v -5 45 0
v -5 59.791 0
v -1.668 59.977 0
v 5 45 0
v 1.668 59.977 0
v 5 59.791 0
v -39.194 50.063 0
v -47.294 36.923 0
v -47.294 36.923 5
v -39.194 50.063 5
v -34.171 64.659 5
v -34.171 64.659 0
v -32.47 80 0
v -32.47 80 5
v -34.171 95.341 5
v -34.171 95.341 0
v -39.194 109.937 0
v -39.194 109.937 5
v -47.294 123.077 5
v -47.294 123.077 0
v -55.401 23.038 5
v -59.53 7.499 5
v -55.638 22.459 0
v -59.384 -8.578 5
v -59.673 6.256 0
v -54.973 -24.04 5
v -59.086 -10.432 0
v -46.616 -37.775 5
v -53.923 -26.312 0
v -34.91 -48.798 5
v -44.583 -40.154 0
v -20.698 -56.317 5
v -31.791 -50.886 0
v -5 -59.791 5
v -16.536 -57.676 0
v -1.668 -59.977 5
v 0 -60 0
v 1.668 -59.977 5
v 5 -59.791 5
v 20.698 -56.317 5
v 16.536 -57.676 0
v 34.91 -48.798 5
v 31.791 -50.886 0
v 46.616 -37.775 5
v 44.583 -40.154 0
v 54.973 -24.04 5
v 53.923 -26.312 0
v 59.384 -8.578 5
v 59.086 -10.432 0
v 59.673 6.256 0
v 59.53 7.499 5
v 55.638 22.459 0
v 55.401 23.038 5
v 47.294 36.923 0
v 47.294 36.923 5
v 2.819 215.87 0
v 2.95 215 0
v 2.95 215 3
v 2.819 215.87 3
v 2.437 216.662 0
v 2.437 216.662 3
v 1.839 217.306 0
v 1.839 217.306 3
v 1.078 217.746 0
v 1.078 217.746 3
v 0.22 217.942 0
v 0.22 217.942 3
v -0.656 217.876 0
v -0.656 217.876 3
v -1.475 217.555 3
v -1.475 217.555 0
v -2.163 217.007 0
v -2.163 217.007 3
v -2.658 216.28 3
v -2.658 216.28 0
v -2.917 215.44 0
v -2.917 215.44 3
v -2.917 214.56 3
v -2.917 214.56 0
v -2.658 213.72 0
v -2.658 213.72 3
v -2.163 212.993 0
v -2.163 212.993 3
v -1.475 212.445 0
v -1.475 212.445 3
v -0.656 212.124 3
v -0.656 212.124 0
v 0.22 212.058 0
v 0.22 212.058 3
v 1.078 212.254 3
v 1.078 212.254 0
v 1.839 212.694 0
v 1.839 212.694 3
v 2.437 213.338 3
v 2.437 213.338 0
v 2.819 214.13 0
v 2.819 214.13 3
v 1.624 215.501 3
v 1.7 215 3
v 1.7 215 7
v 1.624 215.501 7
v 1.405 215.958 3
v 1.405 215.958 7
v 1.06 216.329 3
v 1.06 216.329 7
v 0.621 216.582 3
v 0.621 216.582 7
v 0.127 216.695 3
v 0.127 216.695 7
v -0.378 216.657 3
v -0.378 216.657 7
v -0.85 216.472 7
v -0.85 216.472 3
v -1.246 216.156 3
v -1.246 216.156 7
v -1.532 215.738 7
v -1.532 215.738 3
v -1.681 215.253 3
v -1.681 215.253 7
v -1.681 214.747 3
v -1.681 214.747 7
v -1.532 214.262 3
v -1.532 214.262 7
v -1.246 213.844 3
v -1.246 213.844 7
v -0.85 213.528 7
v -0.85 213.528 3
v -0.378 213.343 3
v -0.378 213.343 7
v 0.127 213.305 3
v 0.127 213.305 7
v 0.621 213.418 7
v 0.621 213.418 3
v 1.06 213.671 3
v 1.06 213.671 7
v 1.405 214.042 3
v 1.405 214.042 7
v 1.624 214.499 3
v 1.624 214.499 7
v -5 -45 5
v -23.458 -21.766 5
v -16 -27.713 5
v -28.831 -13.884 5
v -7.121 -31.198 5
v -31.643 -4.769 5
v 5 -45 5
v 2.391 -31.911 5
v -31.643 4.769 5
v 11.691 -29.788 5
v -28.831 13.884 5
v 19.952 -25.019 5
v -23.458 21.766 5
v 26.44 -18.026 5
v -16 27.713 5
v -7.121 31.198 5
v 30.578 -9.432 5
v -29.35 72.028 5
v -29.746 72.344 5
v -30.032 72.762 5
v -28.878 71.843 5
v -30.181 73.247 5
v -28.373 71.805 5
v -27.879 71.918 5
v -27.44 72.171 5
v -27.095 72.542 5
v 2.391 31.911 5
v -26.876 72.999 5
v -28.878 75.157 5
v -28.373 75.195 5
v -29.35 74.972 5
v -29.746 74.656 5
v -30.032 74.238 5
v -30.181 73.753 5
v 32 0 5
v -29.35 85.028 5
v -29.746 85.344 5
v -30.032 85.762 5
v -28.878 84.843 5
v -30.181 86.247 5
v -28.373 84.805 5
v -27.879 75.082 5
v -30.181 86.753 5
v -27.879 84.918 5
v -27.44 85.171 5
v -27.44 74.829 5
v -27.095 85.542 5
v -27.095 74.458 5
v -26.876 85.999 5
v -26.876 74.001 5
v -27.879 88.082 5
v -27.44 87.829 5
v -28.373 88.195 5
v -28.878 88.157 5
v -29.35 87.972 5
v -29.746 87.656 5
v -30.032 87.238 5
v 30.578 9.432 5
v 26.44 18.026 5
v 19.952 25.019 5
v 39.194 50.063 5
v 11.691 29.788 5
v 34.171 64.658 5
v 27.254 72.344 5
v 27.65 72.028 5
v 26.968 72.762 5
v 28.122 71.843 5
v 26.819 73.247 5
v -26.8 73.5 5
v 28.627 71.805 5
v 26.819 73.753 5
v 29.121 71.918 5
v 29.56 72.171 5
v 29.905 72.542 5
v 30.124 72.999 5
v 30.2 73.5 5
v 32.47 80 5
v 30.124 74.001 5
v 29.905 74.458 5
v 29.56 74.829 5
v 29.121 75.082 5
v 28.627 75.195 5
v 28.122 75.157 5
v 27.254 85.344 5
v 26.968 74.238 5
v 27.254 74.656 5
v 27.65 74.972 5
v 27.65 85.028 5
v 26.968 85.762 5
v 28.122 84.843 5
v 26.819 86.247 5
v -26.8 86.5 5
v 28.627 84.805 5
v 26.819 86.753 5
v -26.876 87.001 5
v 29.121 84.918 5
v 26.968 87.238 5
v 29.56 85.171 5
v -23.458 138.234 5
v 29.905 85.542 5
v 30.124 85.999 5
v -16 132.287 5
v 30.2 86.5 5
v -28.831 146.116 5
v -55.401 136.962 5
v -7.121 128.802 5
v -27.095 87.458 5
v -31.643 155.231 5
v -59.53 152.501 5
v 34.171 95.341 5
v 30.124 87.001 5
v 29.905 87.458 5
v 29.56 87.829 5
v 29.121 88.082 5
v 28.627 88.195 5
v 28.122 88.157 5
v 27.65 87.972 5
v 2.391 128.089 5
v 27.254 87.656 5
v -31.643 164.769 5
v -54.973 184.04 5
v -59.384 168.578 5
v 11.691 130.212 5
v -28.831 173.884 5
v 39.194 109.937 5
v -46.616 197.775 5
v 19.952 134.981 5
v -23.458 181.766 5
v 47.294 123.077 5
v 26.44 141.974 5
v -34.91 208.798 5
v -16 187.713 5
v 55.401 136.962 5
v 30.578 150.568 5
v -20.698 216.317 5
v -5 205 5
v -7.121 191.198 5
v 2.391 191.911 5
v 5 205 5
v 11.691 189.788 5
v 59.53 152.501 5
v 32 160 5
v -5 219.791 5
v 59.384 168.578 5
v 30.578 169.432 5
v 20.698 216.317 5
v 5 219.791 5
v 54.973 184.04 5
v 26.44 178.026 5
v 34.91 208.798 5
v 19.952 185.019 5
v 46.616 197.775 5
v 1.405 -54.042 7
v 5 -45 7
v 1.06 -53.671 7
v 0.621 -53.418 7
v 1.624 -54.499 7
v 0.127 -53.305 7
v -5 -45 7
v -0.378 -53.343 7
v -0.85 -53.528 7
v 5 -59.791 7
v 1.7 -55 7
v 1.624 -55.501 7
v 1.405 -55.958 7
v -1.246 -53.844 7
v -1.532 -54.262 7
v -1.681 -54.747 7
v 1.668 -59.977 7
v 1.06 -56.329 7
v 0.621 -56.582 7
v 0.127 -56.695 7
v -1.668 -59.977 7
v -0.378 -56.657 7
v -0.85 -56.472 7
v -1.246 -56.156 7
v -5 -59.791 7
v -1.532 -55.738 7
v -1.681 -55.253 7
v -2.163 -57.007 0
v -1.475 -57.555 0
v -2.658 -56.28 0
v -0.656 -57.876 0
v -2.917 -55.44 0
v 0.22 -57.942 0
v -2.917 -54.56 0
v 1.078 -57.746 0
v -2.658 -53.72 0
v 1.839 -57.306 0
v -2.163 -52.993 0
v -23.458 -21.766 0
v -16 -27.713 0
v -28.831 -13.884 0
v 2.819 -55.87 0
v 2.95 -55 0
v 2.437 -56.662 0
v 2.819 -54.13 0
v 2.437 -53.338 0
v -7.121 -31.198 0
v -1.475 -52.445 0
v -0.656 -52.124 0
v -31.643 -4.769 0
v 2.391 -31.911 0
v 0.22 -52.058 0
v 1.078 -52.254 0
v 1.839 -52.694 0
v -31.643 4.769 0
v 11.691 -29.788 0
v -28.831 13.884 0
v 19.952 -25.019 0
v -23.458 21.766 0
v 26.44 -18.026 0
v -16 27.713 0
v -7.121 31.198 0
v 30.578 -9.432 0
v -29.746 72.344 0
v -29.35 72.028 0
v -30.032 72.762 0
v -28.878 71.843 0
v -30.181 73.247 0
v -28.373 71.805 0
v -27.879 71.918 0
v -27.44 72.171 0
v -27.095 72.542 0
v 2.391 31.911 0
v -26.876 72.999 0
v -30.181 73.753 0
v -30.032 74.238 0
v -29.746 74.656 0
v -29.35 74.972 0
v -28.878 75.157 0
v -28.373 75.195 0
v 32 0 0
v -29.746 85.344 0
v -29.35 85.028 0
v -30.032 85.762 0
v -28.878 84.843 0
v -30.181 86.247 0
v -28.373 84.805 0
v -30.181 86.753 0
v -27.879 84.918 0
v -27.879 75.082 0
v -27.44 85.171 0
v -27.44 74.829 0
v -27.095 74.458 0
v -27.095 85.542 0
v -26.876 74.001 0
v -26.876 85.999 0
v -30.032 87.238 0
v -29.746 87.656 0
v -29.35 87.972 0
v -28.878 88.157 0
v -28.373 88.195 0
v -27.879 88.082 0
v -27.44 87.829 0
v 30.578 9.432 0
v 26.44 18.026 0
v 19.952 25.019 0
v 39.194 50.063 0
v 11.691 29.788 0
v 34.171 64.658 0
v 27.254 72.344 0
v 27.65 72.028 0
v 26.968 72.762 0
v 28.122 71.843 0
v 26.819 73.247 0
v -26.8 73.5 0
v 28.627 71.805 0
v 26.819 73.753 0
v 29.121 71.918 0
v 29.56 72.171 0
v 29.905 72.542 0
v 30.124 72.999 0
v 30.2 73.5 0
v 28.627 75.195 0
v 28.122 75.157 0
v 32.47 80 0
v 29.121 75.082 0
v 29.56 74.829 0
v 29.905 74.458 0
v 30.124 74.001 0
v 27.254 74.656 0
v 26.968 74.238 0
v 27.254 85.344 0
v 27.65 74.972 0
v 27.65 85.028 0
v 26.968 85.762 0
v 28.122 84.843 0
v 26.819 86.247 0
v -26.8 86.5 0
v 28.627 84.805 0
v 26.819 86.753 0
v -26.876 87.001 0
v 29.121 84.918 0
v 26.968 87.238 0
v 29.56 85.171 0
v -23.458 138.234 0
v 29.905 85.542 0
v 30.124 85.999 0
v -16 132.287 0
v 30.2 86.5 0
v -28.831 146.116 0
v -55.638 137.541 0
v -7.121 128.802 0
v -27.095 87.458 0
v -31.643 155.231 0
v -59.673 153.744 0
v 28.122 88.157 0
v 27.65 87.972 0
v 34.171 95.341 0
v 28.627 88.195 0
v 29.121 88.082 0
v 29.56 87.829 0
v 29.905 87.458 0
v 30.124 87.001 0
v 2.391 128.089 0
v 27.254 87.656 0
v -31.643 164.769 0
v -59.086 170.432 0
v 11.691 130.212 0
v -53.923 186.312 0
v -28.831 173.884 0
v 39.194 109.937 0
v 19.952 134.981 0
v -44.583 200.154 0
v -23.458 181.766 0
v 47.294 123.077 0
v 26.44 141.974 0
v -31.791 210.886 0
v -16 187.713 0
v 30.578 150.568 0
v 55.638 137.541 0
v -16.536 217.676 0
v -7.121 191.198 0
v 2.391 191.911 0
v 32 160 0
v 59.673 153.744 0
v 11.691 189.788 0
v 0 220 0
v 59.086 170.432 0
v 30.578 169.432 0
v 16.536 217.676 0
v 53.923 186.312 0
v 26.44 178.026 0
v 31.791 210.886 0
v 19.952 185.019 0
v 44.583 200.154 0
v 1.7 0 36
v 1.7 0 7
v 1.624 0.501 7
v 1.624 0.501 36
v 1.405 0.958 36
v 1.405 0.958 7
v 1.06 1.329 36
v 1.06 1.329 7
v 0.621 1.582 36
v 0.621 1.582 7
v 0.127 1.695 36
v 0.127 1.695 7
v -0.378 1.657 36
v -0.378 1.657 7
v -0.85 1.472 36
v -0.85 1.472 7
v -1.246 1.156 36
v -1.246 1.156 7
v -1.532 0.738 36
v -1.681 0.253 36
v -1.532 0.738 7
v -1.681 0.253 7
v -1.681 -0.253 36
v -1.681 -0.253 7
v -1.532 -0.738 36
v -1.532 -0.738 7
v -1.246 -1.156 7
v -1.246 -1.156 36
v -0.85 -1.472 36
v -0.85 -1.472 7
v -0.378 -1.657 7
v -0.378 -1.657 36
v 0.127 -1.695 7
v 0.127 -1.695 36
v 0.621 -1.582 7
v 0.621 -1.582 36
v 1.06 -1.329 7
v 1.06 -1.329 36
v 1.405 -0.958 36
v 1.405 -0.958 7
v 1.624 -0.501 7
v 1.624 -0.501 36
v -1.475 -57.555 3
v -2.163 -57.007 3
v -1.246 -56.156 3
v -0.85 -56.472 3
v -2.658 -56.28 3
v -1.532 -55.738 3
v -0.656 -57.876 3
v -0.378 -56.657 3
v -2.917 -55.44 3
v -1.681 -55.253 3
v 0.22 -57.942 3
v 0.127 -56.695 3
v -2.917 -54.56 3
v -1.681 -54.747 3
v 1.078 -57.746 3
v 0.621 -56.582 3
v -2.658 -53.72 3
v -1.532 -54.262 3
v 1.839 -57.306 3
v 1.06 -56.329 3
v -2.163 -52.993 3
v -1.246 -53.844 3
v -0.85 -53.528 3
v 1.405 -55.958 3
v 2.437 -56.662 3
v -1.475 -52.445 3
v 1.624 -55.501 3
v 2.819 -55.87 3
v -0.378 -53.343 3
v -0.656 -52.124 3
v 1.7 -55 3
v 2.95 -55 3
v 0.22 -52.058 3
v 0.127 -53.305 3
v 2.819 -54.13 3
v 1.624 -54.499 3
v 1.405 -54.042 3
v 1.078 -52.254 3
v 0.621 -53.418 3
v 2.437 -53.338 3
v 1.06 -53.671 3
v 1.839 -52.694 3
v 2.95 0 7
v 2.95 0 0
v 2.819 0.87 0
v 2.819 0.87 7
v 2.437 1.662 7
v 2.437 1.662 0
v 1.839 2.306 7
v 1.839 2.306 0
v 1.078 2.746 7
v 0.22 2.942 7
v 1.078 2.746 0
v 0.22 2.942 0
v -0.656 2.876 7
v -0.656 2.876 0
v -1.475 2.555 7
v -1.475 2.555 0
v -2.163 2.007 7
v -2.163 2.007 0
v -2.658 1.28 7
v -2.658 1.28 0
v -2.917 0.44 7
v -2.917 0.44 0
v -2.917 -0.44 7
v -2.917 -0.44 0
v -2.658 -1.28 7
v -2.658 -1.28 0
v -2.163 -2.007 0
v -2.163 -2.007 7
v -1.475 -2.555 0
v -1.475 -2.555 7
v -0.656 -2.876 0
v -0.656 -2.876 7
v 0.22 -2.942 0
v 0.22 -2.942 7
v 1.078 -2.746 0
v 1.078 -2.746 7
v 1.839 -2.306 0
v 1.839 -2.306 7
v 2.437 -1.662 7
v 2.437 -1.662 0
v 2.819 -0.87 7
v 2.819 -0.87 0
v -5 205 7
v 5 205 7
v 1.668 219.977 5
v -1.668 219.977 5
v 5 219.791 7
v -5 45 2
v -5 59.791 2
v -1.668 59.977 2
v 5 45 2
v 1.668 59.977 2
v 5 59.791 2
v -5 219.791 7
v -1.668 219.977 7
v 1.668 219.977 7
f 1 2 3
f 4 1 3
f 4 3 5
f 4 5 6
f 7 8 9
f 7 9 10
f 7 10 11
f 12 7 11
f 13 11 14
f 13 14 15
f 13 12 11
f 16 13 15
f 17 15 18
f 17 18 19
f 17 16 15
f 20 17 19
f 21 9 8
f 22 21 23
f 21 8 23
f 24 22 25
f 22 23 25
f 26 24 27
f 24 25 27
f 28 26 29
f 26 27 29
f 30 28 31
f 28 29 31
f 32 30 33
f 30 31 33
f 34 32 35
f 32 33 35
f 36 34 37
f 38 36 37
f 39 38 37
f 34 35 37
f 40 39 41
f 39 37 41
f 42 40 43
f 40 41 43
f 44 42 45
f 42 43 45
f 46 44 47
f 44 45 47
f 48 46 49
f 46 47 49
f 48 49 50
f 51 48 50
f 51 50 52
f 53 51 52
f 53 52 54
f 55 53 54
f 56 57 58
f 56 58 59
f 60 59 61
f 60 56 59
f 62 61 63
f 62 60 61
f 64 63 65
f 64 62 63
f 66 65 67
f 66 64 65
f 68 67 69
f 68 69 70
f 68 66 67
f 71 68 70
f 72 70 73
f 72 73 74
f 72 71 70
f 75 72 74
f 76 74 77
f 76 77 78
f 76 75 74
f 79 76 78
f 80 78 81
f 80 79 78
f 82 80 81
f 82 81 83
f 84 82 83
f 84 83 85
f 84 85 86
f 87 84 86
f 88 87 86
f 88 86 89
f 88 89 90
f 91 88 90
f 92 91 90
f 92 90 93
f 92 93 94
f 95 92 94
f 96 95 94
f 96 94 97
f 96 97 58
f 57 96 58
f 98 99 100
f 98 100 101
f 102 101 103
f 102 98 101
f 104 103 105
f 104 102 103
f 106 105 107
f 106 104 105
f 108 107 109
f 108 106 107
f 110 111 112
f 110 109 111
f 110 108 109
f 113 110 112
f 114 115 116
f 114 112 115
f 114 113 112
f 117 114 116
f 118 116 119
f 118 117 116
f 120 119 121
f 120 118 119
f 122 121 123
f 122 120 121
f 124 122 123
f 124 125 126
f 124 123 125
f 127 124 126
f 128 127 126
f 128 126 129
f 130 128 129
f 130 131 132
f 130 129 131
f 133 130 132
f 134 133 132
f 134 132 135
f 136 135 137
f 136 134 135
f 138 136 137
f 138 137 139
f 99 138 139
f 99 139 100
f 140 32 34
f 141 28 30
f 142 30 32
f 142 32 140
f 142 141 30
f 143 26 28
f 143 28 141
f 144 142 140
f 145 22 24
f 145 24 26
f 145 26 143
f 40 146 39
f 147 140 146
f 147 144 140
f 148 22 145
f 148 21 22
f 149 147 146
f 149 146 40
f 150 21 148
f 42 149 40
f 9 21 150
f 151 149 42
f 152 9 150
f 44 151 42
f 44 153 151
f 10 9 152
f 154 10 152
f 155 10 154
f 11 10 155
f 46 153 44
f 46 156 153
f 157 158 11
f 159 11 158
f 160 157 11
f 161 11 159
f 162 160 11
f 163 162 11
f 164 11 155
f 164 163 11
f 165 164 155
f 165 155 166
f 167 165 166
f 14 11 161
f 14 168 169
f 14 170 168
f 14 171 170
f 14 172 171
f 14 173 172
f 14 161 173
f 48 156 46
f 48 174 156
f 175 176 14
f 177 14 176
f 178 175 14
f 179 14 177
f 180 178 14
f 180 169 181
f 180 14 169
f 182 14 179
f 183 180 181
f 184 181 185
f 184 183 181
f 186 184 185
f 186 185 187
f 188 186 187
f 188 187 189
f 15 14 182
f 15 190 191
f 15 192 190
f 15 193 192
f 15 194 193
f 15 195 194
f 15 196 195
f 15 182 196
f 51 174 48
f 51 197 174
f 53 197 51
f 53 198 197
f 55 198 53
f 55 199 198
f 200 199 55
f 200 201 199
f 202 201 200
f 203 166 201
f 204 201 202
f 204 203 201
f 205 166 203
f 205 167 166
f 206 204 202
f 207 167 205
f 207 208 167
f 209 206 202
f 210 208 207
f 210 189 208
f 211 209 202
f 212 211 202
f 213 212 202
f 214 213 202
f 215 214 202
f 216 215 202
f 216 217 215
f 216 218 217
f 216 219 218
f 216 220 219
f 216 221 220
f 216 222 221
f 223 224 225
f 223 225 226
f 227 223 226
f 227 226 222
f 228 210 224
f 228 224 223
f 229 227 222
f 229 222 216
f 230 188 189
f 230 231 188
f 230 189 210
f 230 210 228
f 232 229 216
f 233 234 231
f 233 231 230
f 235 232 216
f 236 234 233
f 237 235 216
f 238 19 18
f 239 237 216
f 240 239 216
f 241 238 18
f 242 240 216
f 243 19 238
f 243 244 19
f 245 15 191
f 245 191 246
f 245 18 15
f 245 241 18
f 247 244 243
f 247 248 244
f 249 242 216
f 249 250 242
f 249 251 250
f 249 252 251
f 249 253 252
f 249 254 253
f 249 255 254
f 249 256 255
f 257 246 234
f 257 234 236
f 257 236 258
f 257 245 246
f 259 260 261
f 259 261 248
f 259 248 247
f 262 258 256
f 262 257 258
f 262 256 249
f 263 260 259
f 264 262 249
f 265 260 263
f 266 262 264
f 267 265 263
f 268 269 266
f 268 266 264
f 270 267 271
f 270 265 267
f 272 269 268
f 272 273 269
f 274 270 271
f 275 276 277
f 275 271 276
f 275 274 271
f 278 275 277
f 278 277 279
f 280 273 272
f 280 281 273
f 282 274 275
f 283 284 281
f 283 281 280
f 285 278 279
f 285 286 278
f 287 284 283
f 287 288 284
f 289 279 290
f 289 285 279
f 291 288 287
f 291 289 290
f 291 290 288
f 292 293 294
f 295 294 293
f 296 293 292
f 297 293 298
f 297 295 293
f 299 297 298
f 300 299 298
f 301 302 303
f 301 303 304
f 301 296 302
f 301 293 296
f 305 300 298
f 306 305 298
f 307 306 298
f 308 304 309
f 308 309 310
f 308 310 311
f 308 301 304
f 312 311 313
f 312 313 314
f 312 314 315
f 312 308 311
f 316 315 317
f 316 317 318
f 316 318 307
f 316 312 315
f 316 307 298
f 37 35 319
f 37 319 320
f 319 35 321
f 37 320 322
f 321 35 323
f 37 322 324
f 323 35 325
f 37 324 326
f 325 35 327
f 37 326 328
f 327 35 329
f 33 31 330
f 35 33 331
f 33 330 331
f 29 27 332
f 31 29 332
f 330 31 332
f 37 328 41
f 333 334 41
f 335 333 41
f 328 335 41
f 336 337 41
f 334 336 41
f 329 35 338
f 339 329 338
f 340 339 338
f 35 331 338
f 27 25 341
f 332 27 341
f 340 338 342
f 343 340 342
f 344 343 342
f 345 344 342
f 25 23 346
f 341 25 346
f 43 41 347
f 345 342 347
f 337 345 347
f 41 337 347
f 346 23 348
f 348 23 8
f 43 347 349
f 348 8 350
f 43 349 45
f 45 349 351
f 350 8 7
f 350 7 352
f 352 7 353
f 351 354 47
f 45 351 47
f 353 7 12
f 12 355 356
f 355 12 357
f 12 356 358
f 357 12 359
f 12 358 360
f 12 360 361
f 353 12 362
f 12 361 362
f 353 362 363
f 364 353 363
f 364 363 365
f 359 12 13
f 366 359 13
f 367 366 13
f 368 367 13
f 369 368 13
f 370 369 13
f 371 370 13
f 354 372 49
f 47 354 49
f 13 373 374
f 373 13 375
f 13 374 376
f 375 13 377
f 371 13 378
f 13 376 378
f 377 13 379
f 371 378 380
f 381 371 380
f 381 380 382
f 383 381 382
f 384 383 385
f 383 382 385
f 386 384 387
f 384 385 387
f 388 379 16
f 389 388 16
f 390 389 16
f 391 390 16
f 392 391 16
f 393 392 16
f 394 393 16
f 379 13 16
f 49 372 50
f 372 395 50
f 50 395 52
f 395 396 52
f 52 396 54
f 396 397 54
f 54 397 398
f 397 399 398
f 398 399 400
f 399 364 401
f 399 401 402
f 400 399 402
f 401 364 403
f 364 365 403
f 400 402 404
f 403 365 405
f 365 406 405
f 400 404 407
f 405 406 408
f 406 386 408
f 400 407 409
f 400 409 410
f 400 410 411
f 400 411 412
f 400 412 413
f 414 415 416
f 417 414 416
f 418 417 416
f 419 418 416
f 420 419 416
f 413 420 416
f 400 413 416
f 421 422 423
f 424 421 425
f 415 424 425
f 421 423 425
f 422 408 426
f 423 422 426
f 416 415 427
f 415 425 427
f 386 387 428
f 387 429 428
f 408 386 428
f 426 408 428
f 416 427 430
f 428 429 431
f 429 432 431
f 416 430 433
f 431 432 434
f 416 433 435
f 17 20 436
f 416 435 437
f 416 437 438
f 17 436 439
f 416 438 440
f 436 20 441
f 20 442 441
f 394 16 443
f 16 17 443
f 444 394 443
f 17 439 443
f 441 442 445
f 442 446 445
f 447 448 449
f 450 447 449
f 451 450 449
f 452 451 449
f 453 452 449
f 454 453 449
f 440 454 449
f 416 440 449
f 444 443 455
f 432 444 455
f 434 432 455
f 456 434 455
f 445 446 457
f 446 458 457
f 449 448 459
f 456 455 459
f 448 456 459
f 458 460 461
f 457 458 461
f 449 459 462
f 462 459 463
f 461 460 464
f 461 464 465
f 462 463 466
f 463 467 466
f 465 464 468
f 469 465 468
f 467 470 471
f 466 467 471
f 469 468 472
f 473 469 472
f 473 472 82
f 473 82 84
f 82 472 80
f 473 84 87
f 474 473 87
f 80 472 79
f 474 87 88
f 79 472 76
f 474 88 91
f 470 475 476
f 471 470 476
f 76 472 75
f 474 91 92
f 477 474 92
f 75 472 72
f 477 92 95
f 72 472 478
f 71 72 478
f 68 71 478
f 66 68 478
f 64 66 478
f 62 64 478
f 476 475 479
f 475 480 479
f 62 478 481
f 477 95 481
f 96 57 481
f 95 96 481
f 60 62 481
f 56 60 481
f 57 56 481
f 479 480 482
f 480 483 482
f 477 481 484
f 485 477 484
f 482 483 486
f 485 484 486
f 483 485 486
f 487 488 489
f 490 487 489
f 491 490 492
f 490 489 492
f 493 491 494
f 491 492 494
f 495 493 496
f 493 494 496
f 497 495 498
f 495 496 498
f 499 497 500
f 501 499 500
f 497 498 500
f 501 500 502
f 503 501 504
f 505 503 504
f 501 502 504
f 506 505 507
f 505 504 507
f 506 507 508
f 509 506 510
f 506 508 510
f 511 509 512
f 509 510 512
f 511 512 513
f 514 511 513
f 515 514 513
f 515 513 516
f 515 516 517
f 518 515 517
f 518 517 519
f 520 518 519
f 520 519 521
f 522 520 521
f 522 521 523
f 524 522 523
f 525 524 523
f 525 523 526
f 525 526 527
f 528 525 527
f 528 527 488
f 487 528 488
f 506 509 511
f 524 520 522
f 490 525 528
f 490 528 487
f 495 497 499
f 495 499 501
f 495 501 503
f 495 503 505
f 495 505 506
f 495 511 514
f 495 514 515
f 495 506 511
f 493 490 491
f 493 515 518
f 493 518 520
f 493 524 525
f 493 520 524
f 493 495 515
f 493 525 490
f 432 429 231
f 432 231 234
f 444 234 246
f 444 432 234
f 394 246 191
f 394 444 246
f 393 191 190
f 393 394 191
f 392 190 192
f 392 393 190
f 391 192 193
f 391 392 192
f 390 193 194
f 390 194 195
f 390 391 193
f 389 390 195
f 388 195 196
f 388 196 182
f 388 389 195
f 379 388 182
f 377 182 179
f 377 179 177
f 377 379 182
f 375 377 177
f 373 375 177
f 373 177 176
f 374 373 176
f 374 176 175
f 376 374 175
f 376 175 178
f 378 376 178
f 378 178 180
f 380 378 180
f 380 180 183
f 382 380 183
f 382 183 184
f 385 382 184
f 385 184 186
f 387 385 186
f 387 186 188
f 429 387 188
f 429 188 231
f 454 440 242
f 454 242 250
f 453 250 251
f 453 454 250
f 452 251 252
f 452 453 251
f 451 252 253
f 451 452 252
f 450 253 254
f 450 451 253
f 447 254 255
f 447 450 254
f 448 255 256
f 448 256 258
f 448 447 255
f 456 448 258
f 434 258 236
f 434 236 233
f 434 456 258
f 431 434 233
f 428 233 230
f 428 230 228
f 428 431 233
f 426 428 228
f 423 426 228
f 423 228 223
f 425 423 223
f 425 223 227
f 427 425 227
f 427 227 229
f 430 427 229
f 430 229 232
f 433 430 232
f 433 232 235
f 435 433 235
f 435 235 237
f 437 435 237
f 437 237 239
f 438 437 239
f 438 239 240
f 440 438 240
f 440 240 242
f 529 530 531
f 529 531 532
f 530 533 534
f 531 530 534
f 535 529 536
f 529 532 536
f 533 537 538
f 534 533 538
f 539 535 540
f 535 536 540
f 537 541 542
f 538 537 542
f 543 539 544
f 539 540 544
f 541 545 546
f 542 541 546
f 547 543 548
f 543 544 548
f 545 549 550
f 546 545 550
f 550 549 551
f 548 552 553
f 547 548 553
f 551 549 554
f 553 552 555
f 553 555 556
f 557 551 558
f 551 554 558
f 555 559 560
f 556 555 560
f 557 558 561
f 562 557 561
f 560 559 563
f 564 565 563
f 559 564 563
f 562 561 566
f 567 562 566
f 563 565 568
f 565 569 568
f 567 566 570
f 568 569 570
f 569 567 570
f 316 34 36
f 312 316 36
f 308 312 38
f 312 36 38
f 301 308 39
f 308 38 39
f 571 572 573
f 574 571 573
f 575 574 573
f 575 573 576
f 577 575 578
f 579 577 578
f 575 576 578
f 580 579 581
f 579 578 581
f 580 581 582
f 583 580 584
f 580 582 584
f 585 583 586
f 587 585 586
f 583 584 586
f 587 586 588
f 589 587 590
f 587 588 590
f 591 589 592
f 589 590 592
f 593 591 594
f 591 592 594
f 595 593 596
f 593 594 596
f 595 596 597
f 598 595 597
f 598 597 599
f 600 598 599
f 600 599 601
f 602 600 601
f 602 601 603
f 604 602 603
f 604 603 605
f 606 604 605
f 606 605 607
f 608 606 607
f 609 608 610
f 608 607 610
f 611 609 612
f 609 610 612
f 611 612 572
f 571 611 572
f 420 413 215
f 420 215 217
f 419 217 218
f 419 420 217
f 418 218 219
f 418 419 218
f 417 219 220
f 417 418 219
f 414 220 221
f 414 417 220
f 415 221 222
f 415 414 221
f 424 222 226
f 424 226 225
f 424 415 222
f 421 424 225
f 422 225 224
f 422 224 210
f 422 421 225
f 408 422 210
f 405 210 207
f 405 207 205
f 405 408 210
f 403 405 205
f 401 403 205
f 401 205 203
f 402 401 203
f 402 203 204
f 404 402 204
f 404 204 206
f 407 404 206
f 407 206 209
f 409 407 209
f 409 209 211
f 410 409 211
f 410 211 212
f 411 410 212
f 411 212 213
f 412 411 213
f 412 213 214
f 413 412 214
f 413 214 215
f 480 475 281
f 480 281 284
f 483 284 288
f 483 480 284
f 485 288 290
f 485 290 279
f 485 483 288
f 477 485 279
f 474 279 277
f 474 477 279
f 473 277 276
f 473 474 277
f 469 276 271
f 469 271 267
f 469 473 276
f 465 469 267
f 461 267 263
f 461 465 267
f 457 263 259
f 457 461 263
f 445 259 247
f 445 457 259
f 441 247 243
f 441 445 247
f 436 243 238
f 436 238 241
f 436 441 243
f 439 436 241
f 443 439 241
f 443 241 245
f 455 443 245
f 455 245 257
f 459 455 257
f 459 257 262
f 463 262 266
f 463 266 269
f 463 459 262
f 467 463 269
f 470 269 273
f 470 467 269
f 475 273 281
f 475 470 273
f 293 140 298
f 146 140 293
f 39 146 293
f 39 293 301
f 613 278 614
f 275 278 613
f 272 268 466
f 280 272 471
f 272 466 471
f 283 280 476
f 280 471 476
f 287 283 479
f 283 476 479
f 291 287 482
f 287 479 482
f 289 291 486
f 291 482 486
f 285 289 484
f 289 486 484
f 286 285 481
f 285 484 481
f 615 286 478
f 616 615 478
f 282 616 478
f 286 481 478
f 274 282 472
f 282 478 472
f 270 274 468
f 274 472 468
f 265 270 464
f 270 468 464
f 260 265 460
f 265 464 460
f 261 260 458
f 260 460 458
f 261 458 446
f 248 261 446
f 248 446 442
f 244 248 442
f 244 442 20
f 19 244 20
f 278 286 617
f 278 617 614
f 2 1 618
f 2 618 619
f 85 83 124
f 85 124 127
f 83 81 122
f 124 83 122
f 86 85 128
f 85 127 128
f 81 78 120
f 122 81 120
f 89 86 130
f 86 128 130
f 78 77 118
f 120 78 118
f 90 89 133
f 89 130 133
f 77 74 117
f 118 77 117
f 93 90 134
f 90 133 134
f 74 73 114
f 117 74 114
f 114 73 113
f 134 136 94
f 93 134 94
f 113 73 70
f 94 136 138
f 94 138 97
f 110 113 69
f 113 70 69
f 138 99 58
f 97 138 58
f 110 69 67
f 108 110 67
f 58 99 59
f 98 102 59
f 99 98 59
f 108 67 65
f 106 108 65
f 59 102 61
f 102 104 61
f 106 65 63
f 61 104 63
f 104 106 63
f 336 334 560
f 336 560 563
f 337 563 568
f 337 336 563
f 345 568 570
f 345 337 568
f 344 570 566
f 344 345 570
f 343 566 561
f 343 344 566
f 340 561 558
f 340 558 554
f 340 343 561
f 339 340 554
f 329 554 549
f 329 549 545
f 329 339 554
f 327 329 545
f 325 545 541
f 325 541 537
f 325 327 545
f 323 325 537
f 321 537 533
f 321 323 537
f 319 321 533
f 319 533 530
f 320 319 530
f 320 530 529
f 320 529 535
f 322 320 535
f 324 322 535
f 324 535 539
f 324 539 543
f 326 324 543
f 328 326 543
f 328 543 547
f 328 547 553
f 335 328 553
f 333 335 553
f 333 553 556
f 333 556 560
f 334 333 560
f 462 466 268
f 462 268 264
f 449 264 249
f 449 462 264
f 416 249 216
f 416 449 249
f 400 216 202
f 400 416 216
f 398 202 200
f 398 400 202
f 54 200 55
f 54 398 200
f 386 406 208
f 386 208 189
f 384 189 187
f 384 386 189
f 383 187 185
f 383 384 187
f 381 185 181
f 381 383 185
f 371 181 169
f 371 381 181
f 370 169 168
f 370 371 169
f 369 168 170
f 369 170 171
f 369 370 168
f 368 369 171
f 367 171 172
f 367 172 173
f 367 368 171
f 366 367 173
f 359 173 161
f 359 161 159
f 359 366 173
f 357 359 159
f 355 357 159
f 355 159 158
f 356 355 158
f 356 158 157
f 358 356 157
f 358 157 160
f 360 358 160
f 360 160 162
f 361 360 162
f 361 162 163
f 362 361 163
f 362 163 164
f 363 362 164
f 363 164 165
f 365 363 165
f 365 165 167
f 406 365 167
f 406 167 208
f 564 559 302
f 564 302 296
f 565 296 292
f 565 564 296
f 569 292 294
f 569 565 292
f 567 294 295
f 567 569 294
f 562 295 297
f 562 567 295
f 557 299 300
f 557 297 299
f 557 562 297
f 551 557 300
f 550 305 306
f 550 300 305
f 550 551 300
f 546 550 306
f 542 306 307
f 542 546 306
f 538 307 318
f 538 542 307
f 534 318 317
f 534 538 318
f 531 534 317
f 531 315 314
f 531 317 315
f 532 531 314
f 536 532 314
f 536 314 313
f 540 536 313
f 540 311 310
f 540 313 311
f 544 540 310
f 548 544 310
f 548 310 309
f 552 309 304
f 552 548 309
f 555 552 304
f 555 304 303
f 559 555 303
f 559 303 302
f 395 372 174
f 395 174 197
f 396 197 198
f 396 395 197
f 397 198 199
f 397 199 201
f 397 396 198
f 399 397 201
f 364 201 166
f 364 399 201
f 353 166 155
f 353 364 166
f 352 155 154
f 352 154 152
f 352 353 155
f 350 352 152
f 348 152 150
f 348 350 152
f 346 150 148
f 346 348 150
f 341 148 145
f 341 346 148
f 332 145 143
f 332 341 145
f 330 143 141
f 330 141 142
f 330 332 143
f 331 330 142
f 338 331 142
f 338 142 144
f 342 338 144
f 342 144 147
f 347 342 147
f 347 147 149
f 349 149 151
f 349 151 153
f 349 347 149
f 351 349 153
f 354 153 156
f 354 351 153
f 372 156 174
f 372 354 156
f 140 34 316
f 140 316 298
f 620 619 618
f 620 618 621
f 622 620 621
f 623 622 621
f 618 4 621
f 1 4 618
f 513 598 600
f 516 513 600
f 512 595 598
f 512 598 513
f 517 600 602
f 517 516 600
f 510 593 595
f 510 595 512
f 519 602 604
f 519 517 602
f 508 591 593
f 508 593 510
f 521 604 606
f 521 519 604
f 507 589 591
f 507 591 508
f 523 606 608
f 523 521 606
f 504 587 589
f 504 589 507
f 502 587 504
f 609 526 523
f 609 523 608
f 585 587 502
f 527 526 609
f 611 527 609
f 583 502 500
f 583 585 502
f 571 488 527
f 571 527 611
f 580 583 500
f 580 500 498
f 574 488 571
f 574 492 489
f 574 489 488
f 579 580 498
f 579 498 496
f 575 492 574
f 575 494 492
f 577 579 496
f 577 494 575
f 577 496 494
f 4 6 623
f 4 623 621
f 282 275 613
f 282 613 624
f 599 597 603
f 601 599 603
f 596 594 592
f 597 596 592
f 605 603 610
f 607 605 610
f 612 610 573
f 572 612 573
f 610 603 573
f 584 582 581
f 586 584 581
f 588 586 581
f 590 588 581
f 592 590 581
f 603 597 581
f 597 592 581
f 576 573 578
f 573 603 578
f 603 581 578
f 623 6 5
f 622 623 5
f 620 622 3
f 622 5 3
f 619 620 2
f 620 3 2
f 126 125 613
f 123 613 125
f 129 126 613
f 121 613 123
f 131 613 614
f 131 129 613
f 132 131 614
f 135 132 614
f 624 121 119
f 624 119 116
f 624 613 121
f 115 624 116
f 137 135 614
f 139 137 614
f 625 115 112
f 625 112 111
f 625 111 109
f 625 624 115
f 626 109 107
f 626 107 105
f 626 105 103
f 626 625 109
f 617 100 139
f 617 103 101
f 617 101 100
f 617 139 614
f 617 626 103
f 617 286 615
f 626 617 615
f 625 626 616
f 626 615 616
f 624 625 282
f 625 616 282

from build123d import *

# Parameters (mm, degrees)
CYLINDER_R               = 2.95
CYLINDER_DEPTH           = 7
CYLINDER001_R            = 1.7
CYLINDER001_DEPTH        = 30
PAD023_DEPTH             = 2
CLONE185_PLACEMENT_ANGLE = 180
SKETCH031_R              = 32
PAD022_DEPTH             = 5


with BuildPart() as m3bolthead:
    # Cylinder → Cylinder (new body)
    with BuildSketch(Plane.XY):
        Circle(CYLINDER_R)
    extrude(amount=CYLINDER_DEPTH)


with BuildPart() as m3bolt:
    # Cylinder001 → Cylinder001 (new body)
    with BuildSketch(Plane.XY.offset(6)):
        Circle(CYLINDER001_R)
    extrude(amount=CYLINDER001_DEPTH)

    # Fusion: union M3BoltHead
    add(m3bolthead.part)


with BuildPart() as art2coversupportmaster:
    # Sketch032 → Pad023 (new body)
    with BuildSketch(Plane.XY):
        with BuildLine():
            ThreePointArc((5, 59.791304), (0, 60), (-5, 59.791304))
            Line((-5, 45), (-5, 59.791304))
            Line((5, 45), (-5, 45))
            Line((5, 59.791304), (5, 45))
        make_face()
    extrude(amount=PAD023_DEPTH)


with BuildPart() as clone_of_m3bolt057:
    # Clone191 base: copy of M3Bolt
    add(m3bolt.part)


with BuildPart() as clone_of_m3bolt057_1:
    # Clone191 placement: moved
    add(clone_of_m3bolt057.part.moved(Location((28.5, 86.5, -31))))


with BuildPart() as clone_of_m3bolt056:
    # Clone190 base: copy of M3Bolt
    add(m3bolt.part)


with BuildPart() as clone_of_m3bolt056_1:
    # Clone190 placement: moved
    add(clone_of_m3bolt056.part.moved(Location((-28.5, 73.5, -31))))


with BuildPart() as clone_of_m3bolt058:
    # Clone192 base: copy of M3Bolt
    add(m3bolt.part)


with BuildPart() as clone_of_m3bolt058_1:
    # Clone192 placement: moved
    add(clone_of_m3bolt058.part.moved(Location((28.5, 73.5, -31))))


with BuildPart() as clone_of_m3bolt053:
    # Clone186 base: copy of M3Bolt
    add(m3bolt.part)


with BuildPart() as clone_of_m3bolt053_1:
    # Clone186 placement: moved
    add(clone_of_m3bolt053.part.moved(Location((0, 215, -4))))


with BuildPart() as clone_of_m3bolt054:
    # Clone187 base: copy of M3Bolt
    add(m3bolt.part)


with BuildPart() as clone_of_m3bolt054_1:
    # Clone187 placement: moved
    add(clone_of_m3bolt054.part.moved(Location((0, -55, -4))))


with BuildPart() as fusion070:
    # Clone189 base: copy of M3Bolt
    add(m3bolt.part)


with BuildPart() as fusion070_1:
    # Clone189 placement: moved
    add(fusion070.part.moved(Location((-28.5, 86.5, -31))))

    # Fusion070: union Clone of M3Bolt057, Clone of M3Bolt056, Clone of M3Bolt058, Clone of M3Bolt053, Clone of M3Bolt054
    add(clone_of_m3bolt057_1.part)
    add(clone_of_m3bolt056_1.part)
    add(clone_of_m3bolt058_1.part)
    add(clone_of_m3bolt053_1.part)
    add(clone_of_m3bolt054_1.part)


with BuildPart() as clone_of_art2coversupportmaster001:
    # Clone185 base: copy of Art2CoverSupportMaster
    add(art2coversupportmaster.part)


with BuildPart() as clone_of_art2coversupportmaster001_1:
    # Clone185 placement: moved
    add(clone_of_art2coversupportmaster001.part.moved(Location((0, 0, 5))).rotate(Axis((0, 0, 5), (0, 0, 1)), CLONE185_PLACEMENT_ANGLE))


with BuildPart() as clone_of_art2coversupportmaster:
    # Clone184 base: copy of Art2CoverSupportMaster
    add(art2coversupportmaster.part)


with BuildPart() as clone_of_art2coversupportmaster_1:
    # Clone184 placement: moved
    add(clone_of_art2coversupportmaster.part.moved(Location((0, 160, 5))))


with BuildPart() as art2bodybcover:
    # Sketch031 → Pad022 (new body)
    with BuildSketch(Plane.XY):
        with BuildLine():
            ThreePointArc((-47.293593, 36.92311), (-1.1e-05, -60), (47.293607, 36.923092))
            ThreePointArc((47.293593, 123.07689), (32.469508, 79.999989), (47.293607, 36.923092))
            ThreePointArc((47.293593, 123.07689), (0, 220), (-47.293593, 123.07689))
            ThreePointArc((-47.293593, 36.92311), (-32.469508, 80), (-47.293593, 123.07689))
        make_face()
        Circle(SKETCH031_R, mode=Mode.SUBTRACT)
        with Locations((0, 160)):
            Circle(SKETCH031_R, mode=Mode.SUBTRACT)
    extrude(amount=PAD022_DEPTH)

    # Fusion067: union Clone of Art2CoverSupportMaster001, Clone of Art2CoverSupportMaster
    add(clone_of_art2coversupportmaster001_1.part)
    add(clone_of_art2coversupportmaster_1.part)

    # Cut059: cut Fusion070
    add(fusion070_1.part, mode=Mode.SUBTRACT)


solid = Compound([m3bolt.part, art2coversupportmaster.part, art2bodybcover.part])
